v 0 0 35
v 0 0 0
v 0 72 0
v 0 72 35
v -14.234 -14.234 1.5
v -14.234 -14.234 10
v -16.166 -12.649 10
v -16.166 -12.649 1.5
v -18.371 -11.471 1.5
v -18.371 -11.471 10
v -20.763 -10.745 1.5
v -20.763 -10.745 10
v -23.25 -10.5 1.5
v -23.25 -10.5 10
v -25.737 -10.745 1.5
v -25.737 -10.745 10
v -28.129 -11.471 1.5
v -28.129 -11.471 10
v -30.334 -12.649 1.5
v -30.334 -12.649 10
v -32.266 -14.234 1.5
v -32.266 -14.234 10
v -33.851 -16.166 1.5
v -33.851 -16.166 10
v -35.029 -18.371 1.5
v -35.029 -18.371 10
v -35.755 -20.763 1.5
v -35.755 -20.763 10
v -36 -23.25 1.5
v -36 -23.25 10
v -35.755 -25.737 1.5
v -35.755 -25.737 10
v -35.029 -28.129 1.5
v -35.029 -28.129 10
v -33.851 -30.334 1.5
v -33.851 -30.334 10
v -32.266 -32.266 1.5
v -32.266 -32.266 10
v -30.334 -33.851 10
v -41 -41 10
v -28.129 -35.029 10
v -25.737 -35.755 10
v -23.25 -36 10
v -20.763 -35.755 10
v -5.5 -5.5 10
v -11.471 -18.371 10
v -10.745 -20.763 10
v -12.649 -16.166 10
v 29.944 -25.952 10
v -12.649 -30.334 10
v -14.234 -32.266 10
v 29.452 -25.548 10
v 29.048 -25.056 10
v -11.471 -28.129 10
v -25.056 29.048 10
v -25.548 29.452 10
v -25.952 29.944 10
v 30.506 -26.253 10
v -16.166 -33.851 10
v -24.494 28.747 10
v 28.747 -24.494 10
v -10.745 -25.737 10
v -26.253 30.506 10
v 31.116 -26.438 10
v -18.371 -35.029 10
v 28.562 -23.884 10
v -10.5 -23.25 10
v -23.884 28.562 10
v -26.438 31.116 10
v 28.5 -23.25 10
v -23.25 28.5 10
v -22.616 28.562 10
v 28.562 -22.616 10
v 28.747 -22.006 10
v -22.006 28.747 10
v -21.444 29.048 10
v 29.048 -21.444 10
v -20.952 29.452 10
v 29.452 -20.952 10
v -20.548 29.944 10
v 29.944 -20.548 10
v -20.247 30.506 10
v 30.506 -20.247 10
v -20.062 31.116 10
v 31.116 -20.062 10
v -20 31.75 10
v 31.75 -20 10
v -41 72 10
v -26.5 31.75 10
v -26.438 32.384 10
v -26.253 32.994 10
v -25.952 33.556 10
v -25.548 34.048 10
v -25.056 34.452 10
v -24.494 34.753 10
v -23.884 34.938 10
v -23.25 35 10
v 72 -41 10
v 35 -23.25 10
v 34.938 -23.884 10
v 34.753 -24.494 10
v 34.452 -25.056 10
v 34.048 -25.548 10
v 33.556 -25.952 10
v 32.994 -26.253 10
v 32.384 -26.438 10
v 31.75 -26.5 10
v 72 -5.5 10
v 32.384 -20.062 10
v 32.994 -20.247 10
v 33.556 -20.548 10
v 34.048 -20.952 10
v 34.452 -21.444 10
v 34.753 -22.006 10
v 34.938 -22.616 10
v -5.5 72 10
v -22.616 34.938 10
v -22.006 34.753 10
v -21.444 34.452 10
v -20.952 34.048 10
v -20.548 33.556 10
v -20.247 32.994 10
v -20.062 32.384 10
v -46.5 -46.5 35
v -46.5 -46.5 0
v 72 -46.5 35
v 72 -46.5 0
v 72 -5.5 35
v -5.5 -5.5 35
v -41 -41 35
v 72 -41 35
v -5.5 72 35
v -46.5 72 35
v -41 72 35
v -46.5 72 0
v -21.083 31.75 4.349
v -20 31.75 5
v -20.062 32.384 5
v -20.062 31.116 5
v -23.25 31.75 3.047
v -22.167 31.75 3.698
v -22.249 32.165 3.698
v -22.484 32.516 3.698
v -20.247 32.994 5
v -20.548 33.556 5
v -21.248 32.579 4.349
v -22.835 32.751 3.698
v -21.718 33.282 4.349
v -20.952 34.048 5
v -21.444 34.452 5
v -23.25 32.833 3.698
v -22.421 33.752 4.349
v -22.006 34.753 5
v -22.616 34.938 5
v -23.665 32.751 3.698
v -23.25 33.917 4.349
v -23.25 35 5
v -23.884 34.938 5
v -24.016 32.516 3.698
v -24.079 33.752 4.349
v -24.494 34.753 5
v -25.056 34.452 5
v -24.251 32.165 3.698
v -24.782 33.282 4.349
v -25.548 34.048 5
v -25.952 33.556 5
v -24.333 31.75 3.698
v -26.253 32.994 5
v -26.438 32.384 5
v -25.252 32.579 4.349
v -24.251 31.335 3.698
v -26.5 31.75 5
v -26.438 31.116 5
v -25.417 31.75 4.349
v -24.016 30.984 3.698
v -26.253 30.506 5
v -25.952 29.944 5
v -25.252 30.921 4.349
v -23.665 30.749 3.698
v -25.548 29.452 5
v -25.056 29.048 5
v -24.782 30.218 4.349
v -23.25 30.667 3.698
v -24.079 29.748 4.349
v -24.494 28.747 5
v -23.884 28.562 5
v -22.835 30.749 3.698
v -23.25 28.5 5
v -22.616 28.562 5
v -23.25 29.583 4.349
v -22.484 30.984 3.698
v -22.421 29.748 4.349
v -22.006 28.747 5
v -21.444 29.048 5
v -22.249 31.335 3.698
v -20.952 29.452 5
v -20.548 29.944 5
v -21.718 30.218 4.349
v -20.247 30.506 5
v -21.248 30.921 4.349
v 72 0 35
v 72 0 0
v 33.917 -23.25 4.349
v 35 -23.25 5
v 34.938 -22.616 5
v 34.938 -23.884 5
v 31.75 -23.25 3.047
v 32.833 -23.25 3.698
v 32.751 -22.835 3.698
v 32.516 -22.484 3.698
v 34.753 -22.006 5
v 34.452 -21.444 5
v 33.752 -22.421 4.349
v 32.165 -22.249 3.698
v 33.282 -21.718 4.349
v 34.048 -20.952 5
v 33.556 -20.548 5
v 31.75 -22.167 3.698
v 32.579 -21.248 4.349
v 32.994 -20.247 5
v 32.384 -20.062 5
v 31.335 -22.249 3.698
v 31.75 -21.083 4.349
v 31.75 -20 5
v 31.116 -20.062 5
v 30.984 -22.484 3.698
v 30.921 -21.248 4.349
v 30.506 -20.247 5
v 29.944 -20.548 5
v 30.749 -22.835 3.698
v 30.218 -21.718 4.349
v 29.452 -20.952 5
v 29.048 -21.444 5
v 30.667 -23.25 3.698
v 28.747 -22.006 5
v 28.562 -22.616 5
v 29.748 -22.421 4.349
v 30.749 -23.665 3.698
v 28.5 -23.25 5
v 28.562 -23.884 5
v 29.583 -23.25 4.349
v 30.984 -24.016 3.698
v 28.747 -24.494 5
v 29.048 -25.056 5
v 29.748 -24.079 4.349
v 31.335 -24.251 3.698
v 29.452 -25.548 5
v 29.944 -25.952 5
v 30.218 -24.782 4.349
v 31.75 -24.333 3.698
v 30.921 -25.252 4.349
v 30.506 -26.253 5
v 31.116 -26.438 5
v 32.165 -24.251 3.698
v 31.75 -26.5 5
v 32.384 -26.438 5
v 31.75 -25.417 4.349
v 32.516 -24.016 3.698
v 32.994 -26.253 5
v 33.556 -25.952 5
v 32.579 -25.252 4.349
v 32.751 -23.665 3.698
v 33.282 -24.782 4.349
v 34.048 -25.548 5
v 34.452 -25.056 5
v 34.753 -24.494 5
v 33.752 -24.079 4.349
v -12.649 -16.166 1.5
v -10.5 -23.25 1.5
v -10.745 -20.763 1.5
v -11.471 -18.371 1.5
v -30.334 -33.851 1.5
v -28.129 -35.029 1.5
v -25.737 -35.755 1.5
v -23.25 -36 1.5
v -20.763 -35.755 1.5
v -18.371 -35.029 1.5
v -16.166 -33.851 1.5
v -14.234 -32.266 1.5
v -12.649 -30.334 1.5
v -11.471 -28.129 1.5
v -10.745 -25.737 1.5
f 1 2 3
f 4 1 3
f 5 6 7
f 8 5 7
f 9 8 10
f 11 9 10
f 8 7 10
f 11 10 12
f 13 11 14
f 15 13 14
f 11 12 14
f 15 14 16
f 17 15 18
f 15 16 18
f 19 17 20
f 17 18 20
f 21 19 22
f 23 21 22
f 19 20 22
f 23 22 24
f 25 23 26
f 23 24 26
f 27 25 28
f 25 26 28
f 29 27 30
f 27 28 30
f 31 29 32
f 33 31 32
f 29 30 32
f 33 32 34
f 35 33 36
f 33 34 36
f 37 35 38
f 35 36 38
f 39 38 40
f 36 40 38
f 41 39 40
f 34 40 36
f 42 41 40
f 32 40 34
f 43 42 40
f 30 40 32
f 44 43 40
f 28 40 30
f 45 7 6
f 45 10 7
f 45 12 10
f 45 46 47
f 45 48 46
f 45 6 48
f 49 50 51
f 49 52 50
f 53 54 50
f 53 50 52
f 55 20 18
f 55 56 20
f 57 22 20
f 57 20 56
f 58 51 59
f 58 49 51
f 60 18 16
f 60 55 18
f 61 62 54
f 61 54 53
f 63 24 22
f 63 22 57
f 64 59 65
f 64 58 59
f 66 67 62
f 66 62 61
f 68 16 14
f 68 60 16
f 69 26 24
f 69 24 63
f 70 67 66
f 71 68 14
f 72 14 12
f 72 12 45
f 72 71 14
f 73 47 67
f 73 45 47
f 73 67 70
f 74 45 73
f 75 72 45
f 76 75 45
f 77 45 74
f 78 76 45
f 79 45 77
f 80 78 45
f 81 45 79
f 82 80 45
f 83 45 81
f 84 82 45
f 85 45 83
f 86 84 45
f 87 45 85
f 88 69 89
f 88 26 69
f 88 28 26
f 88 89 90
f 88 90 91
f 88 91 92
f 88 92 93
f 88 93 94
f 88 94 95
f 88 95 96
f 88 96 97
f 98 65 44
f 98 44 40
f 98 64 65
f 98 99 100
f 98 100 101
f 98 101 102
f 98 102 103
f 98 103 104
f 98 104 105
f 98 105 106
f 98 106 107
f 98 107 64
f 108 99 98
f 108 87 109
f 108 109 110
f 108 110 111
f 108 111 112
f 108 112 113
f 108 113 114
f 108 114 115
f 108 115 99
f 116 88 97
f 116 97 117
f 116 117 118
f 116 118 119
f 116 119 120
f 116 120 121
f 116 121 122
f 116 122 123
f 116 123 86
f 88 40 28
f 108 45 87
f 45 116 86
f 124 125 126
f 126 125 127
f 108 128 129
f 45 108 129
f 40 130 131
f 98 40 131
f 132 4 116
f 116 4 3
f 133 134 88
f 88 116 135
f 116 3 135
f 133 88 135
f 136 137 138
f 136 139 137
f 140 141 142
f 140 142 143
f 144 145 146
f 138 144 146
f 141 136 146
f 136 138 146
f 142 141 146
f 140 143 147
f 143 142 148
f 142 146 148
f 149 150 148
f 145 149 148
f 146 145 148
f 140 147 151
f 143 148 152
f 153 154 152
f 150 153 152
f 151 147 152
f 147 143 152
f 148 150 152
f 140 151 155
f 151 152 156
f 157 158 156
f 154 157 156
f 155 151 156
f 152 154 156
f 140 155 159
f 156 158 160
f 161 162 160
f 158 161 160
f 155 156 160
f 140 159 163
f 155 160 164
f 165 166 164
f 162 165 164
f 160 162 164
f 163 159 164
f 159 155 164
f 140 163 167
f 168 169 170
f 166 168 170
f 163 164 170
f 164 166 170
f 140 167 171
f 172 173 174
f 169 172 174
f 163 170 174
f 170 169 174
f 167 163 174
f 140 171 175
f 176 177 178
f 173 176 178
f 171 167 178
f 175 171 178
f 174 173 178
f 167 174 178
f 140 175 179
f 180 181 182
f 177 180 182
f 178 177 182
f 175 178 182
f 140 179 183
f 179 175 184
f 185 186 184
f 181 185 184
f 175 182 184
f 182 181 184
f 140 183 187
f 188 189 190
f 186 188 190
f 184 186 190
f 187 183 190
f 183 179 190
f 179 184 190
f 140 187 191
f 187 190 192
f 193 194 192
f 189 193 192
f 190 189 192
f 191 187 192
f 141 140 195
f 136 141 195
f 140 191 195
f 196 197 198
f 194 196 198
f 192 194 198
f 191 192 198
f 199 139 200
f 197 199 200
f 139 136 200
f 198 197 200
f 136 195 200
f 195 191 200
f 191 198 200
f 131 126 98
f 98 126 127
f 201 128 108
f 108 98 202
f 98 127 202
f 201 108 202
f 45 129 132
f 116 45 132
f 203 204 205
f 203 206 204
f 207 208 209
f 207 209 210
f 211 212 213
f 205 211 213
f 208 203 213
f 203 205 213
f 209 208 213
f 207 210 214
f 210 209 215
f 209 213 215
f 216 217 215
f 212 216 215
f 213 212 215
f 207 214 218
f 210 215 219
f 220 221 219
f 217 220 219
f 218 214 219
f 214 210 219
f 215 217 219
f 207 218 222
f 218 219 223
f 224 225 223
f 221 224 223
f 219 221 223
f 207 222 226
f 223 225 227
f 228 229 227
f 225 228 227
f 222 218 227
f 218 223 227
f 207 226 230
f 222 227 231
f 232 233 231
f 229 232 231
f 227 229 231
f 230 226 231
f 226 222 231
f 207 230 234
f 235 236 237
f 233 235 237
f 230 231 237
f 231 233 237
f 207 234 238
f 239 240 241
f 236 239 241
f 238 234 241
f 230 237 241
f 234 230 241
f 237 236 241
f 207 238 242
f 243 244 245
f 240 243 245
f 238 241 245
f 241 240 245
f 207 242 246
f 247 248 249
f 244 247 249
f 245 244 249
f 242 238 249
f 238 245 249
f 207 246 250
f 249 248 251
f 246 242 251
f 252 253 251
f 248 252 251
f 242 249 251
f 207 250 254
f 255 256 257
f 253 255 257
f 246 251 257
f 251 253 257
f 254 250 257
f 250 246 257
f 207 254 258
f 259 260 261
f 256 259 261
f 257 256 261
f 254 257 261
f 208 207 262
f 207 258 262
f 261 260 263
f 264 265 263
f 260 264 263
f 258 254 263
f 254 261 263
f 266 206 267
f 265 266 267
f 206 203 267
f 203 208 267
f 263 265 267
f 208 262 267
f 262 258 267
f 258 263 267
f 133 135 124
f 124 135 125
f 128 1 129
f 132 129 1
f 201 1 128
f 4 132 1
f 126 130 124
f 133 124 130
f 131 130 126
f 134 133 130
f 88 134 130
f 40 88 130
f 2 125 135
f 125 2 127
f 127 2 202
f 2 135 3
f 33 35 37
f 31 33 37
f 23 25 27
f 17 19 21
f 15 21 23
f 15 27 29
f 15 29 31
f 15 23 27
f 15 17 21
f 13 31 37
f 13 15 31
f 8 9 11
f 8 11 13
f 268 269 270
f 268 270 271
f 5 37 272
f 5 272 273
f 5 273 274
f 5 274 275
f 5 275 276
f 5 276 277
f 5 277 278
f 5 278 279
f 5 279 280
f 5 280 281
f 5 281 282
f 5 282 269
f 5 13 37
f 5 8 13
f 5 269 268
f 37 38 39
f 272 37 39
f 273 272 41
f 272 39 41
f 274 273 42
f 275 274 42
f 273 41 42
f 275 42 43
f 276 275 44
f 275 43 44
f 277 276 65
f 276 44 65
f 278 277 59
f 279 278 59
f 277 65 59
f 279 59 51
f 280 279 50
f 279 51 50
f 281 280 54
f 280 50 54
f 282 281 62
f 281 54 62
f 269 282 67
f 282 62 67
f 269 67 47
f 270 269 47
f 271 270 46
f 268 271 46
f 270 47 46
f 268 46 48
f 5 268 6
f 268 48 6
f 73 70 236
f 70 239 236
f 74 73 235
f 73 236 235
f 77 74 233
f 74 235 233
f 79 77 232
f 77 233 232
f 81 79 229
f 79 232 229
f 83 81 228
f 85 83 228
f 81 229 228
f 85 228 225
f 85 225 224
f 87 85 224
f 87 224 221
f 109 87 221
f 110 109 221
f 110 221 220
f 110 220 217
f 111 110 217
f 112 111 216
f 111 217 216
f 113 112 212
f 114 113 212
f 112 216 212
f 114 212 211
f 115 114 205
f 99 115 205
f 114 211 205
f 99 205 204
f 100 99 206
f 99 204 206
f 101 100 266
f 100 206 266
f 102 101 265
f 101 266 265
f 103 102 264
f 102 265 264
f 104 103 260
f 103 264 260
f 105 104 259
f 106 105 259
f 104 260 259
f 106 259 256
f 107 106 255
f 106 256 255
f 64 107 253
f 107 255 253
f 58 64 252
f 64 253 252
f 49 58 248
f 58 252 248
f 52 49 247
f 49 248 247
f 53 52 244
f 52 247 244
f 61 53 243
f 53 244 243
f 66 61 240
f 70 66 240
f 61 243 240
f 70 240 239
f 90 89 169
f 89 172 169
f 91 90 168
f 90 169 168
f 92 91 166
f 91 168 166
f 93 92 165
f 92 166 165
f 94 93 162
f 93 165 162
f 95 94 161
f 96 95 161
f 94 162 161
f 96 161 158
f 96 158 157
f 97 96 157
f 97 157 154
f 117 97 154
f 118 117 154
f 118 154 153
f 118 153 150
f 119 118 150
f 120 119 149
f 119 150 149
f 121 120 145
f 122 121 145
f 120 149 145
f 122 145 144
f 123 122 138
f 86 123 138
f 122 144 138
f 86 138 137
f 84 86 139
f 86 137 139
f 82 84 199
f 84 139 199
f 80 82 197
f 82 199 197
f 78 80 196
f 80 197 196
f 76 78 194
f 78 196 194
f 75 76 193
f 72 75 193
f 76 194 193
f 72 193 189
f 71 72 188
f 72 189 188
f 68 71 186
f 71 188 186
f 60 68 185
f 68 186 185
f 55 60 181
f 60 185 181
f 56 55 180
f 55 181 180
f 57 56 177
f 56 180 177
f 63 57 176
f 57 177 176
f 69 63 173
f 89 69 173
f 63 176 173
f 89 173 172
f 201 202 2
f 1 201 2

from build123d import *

# Parameters (mm, degrees)
F1_DEPTH = 35
F3_DEPTH = 25
F5_DEPTH = 8.5000004619
F6_D     = 6.5
F6_DEPTH = 5
F6_TIP   = 1.9527970118


with BuildPart() as f1:
    # F0 (on Top) → F1 (new body)
    with BuildSketch(Plane.XY):
        Polygon((72, 0), (0, 0), (0, 72), (-46.5, 72), (-46.5, -46.5), (0, -46.5), (72, -46.5), align=None)
    extrude(amount=F1_DEPTH)

    # F2 (on face) → F3 (cut)
    with BuildSketch(Plane.XY.offset(35)):
        Polygon((-41, 72), (-41, -41), (72, -41), (72, -5.5), (-5.5, -5.5), (-5.5, 72), align=None)
    extrude(amount=-F3_DEPTH, mode=Mode.SUBTRACT)

    # F4 (on face) → F5 (cut)
    with BuildSketch(Plane.XY.offset(10)):
        with BuildLine():
            Line((-14.2343885399, -14.2343885399), (-32.2656114601, -32.2656114601))
            ThreePointArc((-32.2656114601, -32.2656114601), (-18.3707862373, -35.0294640395), (-10.5, -23.25))
            ThreePointArc((-10.5, -23.25), (-11.4705359605, -18.3707862373), (-14.2343885399, -14.2343885399))
        make_face()
        with BuildLine():
            ThreePointArc((-14.2343885399, -14.2343885399), (-32.2656114601, -14.2343885399), (-32.2656114601, -32.2656114601))
            Line((-32.2656114601, -32.2656114601), (-14.2343885399, -14.2343885399))
        make_face()
    extrude(amount=-F5_DEPTH, mode=Mode.SUBTRACT)

    # F6
    with Locations(Plane.XY.offset(10)):
        with Locations((31.75, -23.25), (-23.25, 31.75)):
            Hole(F6_D / 2, depth=F6_DEPTH)
            with Locations((0, 0, -(F6_DEPTH + F6_TIP / 2))):  # 118° drill point
                Cone(0, F6_D / 2, F6_TIP, mode=Mode.SUBTRACT)


solid = f1.part
